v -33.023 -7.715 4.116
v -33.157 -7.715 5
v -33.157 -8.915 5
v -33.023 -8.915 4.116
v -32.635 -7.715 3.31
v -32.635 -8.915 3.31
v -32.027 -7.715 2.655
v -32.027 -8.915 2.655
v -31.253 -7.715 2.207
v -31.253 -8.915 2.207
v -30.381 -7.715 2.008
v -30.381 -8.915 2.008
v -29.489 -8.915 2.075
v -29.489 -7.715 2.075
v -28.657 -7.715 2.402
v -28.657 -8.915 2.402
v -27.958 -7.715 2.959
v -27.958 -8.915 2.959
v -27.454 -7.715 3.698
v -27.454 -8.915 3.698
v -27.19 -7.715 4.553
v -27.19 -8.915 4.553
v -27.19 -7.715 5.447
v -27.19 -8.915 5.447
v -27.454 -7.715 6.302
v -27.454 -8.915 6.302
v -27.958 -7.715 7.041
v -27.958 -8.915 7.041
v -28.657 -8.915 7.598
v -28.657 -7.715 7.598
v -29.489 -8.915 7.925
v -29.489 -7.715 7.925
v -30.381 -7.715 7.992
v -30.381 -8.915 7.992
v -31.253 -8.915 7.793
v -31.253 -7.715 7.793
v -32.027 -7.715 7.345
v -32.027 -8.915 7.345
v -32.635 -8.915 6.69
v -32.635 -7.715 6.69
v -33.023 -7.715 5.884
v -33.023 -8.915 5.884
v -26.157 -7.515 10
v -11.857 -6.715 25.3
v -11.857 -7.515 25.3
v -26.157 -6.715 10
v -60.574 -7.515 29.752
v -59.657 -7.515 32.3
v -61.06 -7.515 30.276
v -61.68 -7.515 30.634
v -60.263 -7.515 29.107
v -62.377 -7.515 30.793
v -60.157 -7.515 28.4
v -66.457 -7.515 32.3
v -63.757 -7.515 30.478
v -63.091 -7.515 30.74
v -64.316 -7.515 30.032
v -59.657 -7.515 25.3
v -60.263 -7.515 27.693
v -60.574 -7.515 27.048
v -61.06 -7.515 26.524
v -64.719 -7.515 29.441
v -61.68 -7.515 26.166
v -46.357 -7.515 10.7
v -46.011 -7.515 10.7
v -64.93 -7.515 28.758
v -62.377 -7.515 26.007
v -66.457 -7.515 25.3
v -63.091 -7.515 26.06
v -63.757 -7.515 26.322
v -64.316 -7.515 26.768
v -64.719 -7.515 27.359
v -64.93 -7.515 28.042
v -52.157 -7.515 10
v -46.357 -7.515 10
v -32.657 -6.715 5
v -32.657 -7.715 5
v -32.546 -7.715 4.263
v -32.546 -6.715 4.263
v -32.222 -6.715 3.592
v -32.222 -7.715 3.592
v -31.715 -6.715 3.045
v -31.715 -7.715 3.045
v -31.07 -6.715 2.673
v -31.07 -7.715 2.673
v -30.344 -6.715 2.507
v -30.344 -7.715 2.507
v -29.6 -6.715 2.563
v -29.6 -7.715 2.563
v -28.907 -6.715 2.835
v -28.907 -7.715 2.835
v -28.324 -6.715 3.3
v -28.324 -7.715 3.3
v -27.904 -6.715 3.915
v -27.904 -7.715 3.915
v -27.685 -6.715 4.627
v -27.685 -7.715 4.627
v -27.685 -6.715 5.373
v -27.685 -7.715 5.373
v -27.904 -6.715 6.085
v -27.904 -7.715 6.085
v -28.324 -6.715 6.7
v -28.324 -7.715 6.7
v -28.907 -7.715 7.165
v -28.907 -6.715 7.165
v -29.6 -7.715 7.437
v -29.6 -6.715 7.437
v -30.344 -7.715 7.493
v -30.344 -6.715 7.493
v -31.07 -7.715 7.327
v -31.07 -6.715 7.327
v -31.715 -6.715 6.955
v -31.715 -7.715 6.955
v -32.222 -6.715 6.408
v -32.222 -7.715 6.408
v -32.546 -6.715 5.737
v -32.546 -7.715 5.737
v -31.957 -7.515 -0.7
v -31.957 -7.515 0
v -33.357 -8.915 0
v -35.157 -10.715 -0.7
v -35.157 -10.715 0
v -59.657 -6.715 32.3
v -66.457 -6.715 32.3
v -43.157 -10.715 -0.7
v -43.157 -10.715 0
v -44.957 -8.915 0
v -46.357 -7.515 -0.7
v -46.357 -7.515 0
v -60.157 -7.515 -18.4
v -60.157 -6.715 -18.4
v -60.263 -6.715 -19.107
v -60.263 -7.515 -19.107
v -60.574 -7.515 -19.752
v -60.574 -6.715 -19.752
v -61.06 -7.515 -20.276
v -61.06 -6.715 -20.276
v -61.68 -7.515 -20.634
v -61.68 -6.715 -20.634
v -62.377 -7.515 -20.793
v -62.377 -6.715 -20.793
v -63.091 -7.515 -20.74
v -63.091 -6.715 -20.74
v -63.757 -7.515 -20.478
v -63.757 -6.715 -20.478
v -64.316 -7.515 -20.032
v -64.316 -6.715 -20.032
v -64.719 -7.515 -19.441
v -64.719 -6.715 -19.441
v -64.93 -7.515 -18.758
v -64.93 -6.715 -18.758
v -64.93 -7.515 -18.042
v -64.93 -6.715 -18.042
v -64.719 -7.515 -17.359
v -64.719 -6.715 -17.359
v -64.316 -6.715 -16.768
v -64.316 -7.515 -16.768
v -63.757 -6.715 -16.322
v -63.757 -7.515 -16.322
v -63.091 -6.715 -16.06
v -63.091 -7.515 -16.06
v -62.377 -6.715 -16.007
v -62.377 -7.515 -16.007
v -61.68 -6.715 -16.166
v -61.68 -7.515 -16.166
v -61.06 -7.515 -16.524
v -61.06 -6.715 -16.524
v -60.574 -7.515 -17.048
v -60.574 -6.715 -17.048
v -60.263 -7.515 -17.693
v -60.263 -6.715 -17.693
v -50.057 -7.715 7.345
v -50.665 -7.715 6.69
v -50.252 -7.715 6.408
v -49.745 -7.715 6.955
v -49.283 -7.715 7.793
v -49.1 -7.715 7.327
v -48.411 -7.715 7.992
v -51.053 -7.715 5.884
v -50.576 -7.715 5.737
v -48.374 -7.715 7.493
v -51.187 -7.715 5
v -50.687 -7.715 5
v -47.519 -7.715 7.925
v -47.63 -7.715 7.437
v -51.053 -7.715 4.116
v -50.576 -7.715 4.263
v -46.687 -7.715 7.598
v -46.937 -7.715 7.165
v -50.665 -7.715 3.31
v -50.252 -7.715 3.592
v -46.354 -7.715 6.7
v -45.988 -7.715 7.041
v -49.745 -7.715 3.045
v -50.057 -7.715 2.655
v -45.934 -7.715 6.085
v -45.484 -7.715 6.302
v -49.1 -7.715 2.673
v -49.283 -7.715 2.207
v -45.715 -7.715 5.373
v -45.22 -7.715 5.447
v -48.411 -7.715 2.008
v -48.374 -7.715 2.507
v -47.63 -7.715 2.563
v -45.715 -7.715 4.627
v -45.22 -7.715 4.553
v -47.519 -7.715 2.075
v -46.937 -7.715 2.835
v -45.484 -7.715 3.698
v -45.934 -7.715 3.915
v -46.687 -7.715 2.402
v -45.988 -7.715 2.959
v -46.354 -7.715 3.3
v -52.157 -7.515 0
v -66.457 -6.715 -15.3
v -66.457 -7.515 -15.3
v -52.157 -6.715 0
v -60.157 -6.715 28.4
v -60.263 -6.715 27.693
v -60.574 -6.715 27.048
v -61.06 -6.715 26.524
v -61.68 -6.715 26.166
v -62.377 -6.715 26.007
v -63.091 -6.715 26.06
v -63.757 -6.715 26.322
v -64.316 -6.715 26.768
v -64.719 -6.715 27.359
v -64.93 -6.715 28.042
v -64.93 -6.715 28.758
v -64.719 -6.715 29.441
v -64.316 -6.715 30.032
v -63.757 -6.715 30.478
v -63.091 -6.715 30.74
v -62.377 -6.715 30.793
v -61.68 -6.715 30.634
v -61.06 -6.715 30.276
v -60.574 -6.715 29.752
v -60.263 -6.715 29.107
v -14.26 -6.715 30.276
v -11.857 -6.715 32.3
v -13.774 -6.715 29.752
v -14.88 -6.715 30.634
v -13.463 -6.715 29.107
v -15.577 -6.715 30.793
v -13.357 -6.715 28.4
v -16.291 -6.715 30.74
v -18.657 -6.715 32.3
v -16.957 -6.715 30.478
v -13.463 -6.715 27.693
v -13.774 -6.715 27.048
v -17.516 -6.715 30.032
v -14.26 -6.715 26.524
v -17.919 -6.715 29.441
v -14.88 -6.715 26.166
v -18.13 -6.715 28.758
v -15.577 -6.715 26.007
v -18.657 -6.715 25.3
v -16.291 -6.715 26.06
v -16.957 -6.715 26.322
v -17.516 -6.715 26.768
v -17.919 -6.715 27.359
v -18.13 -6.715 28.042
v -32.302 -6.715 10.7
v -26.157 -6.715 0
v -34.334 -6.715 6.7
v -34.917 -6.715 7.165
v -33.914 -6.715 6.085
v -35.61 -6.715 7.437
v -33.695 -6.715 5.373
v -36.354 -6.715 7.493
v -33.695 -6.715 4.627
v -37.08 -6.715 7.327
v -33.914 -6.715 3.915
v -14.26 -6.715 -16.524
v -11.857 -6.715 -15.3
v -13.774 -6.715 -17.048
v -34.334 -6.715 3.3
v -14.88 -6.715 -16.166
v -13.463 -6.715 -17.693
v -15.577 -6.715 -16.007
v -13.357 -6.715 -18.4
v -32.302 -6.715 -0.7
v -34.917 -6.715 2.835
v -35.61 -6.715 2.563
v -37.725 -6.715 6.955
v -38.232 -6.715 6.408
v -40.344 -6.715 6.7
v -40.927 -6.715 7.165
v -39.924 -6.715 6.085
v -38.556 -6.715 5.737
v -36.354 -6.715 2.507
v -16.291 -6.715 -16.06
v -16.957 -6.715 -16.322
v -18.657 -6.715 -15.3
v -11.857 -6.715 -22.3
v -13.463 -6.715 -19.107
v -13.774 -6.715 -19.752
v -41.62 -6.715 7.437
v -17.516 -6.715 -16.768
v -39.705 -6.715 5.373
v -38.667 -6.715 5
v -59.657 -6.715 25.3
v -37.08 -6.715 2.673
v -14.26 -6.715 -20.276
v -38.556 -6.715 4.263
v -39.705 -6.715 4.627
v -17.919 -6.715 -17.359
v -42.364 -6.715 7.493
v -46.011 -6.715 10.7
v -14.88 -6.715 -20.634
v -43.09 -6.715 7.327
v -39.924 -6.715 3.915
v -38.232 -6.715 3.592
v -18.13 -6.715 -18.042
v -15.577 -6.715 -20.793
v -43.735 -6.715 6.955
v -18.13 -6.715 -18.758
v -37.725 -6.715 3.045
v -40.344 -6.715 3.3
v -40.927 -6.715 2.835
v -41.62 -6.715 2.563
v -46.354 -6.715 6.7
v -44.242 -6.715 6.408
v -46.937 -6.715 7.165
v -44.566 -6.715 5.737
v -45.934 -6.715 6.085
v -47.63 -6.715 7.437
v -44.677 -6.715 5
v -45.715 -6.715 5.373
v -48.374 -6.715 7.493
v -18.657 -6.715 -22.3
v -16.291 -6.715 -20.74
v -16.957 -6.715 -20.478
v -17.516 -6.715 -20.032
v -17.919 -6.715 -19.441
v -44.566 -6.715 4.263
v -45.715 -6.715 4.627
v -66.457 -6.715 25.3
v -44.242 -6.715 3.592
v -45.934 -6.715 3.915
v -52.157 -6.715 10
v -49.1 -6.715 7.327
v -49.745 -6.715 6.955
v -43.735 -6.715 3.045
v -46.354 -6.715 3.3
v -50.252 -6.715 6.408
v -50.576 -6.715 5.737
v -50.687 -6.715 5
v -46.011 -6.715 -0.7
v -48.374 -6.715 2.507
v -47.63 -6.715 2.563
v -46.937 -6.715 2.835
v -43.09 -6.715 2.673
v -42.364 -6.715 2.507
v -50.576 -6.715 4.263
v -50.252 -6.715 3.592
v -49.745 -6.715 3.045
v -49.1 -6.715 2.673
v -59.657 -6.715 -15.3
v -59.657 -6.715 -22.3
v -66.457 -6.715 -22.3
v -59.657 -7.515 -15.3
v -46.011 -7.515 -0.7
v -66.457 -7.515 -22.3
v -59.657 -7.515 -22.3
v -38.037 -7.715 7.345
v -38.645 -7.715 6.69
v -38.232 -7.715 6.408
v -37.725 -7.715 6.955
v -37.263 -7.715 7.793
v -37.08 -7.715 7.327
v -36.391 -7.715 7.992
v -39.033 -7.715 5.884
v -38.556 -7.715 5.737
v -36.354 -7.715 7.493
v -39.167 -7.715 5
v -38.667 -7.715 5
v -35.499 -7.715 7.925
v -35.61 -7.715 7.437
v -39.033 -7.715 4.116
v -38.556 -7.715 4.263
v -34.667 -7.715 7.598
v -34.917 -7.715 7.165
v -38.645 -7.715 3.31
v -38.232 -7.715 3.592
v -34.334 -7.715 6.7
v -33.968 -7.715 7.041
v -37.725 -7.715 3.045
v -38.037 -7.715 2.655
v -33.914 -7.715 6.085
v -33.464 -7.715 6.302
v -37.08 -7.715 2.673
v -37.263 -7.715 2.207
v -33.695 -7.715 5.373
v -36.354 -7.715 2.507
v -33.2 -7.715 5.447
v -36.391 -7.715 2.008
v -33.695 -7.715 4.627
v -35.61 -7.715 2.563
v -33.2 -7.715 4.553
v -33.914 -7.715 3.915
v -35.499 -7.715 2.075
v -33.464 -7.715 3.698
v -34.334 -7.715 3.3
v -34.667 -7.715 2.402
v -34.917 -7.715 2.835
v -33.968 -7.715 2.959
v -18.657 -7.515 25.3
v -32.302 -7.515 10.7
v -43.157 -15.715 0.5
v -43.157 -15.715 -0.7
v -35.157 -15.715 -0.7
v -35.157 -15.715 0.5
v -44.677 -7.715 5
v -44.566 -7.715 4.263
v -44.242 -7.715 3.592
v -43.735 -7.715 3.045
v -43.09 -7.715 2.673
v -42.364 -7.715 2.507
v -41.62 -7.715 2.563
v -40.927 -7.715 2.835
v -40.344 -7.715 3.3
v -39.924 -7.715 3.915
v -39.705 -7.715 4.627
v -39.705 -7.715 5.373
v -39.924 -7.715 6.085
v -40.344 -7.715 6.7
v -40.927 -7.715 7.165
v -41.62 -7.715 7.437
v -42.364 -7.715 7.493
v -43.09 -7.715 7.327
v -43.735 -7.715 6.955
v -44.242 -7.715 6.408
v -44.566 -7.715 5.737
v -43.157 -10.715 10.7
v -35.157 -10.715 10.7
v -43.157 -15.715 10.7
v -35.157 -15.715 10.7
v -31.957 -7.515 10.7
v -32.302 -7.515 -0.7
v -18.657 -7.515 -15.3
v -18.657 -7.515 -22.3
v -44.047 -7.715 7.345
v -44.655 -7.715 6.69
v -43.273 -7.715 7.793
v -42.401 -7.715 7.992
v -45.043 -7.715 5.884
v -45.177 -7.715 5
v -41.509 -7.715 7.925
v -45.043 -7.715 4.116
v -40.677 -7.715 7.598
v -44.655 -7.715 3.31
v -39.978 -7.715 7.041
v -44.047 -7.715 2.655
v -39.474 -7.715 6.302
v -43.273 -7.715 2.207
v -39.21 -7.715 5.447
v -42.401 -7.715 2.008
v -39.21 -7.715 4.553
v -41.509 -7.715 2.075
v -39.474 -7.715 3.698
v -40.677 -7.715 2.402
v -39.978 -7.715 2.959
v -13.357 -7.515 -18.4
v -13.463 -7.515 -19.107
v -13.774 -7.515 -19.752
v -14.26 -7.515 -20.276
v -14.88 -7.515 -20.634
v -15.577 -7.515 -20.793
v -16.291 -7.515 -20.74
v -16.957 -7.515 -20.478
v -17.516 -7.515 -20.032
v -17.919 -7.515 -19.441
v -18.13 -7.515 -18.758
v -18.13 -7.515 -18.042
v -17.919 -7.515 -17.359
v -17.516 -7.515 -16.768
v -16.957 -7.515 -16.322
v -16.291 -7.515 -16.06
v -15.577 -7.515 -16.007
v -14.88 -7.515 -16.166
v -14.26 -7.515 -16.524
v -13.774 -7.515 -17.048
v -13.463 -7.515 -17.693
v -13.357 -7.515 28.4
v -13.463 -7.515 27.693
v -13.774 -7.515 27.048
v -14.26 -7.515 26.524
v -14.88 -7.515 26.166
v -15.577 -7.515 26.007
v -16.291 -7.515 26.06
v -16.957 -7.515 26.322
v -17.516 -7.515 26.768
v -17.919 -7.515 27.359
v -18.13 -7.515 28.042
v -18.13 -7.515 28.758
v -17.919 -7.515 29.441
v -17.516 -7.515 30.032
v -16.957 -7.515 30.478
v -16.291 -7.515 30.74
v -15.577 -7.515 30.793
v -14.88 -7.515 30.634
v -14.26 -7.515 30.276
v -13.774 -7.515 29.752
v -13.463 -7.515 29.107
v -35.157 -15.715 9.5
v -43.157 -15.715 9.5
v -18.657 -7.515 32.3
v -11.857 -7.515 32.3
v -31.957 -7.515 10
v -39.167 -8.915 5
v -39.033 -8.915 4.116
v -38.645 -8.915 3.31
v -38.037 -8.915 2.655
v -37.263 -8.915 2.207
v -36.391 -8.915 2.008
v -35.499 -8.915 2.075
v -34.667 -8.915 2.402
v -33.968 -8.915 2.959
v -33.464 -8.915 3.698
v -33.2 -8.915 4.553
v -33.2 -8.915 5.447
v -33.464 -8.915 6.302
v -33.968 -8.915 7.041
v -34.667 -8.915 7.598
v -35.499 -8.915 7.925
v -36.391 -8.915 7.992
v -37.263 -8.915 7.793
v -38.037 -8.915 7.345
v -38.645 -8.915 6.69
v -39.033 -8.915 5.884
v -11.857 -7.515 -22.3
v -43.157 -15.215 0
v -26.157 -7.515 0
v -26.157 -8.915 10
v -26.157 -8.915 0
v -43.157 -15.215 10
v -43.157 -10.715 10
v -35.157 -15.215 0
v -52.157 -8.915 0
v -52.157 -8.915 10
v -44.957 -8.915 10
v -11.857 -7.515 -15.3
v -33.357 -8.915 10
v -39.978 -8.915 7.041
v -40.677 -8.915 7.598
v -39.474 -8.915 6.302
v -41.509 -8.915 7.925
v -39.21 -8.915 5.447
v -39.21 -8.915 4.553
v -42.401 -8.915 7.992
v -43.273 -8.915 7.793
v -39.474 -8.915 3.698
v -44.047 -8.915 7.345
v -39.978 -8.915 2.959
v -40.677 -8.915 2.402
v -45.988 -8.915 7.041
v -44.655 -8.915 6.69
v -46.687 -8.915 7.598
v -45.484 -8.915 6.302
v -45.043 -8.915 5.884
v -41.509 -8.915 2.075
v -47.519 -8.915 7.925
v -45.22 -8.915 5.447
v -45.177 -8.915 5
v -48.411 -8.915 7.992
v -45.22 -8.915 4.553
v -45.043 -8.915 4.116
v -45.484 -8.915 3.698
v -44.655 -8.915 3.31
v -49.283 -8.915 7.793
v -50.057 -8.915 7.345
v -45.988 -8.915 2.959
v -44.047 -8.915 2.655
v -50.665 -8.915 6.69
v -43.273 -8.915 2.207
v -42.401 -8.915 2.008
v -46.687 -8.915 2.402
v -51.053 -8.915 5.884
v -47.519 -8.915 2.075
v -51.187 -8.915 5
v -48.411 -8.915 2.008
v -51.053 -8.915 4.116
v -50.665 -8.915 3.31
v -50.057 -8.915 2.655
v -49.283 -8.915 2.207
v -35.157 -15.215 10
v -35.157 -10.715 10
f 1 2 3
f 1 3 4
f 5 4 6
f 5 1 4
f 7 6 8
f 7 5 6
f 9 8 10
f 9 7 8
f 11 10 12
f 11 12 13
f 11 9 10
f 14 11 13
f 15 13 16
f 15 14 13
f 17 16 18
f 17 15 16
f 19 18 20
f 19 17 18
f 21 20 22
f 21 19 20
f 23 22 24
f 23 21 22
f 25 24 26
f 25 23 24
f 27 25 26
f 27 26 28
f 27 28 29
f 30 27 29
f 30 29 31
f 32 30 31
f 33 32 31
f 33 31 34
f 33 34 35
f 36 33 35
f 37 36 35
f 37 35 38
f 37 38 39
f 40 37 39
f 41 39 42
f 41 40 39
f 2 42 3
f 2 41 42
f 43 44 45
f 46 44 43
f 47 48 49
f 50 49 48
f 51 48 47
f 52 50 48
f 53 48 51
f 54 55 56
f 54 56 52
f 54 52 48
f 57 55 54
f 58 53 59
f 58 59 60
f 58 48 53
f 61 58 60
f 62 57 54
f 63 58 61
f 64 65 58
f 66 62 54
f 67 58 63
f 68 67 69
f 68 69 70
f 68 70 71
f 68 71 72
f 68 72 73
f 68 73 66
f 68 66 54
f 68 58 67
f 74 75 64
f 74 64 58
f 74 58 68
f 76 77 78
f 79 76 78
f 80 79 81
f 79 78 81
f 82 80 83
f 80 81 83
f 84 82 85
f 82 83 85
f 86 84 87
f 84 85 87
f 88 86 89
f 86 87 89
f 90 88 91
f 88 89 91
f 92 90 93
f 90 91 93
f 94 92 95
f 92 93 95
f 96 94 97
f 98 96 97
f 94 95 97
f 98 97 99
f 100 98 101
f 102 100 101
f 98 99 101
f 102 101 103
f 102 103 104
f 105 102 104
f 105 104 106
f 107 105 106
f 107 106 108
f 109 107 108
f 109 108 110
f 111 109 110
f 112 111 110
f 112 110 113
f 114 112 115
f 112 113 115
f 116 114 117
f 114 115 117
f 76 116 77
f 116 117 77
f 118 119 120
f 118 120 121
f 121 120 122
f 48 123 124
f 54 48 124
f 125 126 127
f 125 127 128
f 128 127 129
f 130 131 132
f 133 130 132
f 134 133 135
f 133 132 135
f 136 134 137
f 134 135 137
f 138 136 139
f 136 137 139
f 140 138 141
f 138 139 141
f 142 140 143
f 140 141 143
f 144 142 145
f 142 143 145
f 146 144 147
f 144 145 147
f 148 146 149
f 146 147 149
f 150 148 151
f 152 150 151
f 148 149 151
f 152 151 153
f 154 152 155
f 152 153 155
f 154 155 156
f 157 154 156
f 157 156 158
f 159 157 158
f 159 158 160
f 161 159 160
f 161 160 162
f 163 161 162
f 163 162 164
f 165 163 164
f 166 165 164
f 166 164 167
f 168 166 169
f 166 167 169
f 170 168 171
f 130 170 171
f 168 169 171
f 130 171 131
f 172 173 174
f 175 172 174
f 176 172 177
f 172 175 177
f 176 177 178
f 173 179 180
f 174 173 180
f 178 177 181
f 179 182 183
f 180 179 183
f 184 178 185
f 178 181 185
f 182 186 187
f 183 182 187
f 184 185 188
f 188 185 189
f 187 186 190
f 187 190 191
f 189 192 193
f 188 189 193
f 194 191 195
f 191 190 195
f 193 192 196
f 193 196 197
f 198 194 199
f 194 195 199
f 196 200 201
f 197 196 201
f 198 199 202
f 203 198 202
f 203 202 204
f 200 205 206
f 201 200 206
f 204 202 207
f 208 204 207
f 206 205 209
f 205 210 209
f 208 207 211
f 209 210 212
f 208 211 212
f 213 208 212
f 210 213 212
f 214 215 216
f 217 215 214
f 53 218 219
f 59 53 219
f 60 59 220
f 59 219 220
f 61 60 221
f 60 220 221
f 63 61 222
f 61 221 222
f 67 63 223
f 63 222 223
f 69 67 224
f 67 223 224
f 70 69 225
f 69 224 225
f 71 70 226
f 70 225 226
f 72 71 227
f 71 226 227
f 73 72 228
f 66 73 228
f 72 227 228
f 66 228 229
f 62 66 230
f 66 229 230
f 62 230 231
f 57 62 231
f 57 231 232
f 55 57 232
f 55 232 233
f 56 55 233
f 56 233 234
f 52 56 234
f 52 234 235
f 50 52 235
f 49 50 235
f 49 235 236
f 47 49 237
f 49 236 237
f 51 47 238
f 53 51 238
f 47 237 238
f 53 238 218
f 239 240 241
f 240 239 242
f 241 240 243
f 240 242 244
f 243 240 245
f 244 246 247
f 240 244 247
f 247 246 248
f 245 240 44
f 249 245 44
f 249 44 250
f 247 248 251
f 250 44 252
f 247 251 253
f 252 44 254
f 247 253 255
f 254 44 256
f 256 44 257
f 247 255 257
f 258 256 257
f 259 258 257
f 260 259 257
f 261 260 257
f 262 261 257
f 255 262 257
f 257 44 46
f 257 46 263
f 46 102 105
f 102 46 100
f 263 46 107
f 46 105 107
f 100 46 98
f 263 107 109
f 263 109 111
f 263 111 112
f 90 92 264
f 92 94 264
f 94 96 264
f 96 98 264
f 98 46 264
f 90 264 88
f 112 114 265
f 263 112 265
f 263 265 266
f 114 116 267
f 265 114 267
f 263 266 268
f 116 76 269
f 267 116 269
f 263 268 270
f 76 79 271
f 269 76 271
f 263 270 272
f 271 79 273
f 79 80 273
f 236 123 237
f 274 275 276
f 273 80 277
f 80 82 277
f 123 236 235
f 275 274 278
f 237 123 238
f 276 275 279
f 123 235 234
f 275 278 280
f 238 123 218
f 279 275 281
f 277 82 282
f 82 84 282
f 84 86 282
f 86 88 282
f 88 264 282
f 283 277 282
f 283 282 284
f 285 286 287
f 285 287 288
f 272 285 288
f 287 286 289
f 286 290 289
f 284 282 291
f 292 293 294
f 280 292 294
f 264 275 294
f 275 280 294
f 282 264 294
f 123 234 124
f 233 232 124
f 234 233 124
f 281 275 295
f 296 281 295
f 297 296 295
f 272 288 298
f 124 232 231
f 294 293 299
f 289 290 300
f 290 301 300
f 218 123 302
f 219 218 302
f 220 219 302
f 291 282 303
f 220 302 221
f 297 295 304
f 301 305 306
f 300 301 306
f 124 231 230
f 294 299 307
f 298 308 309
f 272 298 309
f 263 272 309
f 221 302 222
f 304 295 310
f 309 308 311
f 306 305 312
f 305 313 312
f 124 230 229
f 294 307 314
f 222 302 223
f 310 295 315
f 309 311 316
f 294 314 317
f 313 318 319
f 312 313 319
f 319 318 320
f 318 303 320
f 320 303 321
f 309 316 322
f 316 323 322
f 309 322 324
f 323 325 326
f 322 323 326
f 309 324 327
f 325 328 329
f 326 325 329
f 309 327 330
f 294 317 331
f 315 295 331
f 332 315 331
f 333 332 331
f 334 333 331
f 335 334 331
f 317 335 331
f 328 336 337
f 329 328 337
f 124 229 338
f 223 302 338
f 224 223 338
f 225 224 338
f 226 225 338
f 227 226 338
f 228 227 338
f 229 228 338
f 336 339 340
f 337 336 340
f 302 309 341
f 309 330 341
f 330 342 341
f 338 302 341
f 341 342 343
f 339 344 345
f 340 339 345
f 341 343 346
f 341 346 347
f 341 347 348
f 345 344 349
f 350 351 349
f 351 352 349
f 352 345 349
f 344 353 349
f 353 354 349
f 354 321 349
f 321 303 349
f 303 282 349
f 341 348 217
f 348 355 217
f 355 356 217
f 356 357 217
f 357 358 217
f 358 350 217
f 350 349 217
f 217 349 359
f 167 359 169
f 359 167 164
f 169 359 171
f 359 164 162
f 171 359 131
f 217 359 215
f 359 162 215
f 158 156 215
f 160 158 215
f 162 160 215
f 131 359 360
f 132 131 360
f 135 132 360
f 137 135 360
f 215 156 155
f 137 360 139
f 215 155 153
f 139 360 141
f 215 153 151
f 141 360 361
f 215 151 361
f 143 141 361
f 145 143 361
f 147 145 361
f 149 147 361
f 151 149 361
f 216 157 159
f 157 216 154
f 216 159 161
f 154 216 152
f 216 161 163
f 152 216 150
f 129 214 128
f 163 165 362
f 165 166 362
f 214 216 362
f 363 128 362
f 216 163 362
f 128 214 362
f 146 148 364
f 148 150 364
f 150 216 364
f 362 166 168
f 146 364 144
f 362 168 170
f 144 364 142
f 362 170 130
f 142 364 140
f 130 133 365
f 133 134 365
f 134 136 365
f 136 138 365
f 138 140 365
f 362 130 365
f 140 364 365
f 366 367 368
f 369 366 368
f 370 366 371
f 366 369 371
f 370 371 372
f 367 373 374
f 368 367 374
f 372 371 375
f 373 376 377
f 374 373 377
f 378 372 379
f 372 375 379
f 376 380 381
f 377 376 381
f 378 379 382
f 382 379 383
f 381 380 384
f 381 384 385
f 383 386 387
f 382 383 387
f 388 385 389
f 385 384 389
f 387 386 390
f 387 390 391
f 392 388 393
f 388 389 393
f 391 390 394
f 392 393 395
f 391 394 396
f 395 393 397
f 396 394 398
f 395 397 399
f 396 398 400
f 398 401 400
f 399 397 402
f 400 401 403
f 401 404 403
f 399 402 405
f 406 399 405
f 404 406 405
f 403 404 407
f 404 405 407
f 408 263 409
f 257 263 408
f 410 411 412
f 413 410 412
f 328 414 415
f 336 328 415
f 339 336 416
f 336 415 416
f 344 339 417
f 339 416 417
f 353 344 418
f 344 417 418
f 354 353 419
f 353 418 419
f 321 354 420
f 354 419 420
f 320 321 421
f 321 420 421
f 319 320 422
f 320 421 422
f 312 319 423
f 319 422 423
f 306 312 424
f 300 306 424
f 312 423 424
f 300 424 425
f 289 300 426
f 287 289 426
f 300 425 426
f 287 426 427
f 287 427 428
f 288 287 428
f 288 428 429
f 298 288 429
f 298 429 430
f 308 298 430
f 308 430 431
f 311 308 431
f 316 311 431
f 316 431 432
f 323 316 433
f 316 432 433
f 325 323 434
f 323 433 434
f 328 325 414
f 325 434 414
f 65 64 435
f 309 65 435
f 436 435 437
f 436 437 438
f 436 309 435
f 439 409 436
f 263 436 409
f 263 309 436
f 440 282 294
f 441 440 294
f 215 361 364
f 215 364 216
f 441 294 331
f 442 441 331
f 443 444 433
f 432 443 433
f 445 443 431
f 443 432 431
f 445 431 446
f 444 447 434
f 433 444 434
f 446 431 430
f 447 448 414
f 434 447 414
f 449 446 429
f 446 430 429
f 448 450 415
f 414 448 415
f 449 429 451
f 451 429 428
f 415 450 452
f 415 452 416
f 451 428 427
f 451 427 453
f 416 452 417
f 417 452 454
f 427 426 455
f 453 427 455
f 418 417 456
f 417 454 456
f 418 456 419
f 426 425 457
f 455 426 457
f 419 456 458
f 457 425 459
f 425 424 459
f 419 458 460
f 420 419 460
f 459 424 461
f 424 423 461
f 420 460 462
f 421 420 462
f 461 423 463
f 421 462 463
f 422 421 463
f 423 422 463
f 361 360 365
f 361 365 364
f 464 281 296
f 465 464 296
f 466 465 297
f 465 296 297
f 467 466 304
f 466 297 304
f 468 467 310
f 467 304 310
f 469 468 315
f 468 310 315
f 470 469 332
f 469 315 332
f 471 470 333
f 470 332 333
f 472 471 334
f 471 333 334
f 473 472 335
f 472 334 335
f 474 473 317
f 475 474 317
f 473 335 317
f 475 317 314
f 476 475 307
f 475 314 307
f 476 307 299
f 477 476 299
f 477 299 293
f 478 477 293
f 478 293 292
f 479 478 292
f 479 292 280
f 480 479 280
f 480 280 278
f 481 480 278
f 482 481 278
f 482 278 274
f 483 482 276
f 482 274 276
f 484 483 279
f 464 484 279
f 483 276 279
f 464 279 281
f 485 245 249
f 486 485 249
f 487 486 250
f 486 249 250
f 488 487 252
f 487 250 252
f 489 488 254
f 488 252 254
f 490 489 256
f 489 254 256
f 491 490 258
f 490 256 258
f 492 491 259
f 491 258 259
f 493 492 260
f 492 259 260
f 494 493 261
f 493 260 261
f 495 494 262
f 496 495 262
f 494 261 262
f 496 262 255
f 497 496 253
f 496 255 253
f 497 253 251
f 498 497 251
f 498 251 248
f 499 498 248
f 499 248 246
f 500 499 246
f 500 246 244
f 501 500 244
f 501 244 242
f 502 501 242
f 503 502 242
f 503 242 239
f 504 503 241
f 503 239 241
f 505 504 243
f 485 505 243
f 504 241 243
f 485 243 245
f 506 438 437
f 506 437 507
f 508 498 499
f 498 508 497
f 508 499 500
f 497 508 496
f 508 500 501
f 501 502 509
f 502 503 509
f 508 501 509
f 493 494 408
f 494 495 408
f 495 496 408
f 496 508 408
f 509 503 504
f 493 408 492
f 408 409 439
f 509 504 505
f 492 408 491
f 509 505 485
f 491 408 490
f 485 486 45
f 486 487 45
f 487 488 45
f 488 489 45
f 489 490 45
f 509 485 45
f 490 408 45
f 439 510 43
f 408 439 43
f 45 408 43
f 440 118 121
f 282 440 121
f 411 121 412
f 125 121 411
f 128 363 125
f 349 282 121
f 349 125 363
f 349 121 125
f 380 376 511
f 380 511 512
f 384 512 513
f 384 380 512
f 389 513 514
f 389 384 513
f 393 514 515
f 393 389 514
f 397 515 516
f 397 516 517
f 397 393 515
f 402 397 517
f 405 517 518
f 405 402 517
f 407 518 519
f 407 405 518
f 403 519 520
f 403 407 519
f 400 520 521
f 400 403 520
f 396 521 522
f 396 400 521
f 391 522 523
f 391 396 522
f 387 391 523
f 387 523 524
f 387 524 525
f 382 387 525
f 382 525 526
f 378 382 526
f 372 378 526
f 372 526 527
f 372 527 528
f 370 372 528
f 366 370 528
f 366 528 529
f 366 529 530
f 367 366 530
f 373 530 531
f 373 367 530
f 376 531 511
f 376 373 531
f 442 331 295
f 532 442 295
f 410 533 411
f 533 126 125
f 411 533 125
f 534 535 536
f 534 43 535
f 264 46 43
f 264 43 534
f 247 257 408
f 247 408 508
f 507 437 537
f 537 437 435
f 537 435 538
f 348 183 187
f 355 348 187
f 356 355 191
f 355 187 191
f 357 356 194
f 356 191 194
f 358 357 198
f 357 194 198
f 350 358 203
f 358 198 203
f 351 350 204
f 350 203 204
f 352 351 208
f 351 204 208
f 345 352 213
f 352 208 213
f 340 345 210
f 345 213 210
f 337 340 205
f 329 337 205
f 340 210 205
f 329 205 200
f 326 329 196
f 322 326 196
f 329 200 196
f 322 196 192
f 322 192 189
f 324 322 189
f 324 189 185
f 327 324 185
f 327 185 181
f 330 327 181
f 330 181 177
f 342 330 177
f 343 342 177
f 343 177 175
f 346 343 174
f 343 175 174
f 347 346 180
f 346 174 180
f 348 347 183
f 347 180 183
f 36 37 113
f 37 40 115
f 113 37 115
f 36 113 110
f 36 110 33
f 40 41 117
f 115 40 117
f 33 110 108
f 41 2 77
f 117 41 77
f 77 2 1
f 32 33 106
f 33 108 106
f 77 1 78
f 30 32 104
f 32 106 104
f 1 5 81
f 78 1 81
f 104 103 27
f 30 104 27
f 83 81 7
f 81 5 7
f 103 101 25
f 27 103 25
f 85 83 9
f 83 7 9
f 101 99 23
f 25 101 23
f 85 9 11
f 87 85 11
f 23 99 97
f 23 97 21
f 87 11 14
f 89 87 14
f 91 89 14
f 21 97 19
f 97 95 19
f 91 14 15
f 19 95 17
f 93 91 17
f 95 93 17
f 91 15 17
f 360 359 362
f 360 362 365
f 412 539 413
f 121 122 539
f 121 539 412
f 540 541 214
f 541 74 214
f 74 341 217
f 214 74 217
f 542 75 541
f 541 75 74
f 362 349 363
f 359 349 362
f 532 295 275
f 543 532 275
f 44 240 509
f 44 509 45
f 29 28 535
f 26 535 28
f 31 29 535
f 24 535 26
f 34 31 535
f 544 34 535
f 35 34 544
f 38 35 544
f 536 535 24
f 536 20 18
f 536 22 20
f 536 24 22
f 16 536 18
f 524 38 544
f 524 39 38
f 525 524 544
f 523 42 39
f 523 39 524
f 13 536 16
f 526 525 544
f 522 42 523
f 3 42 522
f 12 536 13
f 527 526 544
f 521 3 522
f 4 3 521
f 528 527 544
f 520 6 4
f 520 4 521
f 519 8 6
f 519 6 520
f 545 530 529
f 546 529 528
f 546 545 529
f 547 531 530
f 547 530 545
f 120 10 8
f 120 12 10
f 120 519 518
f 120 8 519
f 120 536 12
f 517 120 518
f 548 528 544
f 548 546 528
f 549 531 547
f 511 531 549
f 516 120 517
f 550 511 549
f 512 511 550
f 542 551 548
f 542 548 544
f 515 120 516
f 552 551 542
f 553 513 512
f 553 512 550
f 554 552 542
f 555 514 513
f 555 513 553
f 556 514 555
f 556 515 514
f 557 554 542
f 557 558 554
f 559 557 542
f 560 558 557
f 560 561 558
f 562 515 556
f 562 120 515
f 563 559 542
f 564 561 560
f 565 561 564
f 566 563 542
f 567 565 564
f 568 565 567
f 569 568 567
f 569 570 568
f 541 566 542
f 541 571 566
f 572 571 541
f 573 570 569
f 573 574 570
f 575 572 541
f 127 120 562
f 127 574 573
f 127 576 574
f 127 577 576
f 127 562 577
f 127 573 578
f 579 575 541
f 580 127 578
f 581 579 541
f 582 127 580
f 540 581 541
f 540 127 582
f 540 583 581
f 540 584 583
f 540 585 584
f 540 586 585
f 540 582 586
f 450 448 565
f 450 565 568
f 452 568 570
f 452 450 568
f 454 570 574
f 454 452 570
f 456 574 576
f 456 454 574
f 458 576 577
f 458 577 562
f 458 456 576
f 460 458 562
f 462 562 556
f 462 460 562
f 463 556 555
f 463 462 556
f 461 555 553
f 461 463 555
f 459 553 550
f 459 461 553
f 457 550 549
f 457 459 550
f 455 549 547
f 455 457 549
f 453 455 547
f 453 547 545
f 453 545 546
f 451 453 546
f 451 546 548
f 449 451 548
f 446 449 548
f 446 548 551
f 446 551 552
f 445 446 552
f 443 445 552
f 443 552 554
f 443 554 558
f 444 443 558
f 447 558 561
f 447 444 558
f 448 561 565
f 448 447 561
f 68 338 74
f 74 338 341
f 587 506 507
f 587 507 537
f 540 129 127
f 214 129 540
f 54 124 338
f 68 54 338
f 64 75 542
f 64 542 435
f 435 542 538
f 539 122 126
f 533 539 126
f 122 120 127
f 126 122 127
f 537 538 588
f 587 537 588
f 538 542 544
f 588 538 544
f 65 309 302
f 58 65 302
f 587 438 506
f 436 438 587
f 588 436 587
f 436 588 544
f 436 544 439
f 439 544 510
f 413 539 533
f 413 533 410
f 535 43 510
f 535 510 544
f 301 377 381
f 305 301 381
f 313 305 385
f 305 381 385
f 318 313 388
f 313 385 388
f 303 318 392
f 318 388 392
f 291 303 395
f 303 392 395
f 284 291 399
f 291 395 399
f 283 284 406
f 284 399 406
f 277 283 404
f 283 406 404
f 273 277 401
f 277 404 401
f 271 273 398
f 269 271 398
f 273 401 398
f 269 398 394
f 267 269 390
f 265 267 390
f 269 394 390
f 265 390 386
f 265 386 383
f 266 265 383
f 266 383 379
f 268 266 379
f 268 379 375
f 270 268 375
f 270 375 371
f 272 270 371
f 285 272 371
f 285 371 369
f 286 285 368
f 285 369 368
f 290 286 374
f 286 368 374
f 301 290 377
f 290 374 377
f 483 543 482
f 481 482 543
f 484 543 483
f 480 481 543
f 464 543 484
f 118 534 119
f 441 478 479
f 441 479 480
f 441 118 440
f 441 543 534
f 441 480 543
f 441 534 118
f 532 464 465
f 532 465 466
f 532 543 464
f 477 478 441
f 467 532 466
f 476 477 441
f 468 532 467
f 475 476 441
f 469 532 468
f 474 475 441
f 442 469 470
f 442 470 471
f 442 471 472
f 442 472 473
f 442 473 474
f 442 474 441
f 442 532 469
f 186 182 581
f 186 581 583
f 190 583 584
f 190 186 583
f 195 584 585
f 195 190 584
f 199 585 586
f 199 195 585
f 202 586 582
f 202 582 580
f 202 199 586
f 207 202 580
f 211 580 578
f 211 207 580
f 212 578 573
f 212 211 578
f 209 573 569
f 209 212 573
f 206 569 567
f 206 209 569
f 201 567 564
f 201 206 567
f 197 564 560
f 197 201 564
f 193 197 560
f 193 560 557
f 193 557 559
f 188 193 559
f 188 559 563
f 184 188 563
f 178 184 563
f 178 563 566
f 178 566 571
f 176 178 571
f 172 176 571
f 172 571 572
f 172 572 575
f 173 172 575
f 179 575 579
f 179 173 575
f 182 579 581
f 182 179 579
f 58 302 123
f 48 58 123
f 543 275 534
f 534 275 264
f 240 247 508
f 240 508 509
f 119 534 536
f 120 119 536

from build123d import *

# Parameters (mm, degrees)
SKICA1_W                 = 26
SKICA1_H                 = 1
P_IDAT_VYSUNUT_M1_DEPTH  = 10
SKICA2_R                 = 2.5
ODEBRAT_VYSUNUT_M1_DEPTH = 1
SKICA3_R                 = 2.4
P_IDAT_VYSUNUT_M2_DEPTH  = 0.8
SKICA4_W                 = 26
SKICA4_H                 = 10
SKICA4_R                 = 3
P_IDAT_VYSUNUT_M3_DEPTH  = 1.2
SKICA6_W                 = 8
SKICA6_H                 = 0.7
P_IDAT_VYSUNUT_M5_DEPTH  = 9
P_IDAT_VYSUNUT_M6_DEPTH  = 8
P_IDAT_VYSUNUT_M8_DEPTH  = 0.7
P_IDAT_VYSUNUT_M9_DEPTH  = 0.7


with BuildPart() as part:
    # Skica1 → Přidat vysunutím1 (new body)
    with BuildSketch(Plane.XY):
        with Locations((-39.156744291, -7.214704976)):
            Rectangle(SKICA1_W, SKICA1_H)
    extrude(amount=P_IDAT_VYSUNUT_M1_DEPTH)

    # Skica2 → Odebrat vysunutím1 (cut)
    with BuildSketch(Plane(origin=(0, -7.714704976, 0), x_dir=(-1, 0, 0), z_dir=(0, -1, 0))):
        with Locations((48.186744291, -5)):
            Circle(SKICA2_R)
        with Locations((42.176744291, -5)):
            Circle(SKICA2_R)
        with Locations((36.166744291, -5)):
            Circle(SKICA2_R)
        with Locations((30.156744291, -5)):
            Circle(SKICA2_R)
    extrude(amount=-ODEBRAT_VYSUNUT_M1_DEPTH, mode=Mode.SUBTRACT)

    # Skica3 → Přidat vysunutím2 (add)
    with BuildSketch(Plane(origin=(0, -6.714704976, 0), x_dir=(1, 0, 0), z_dir=(0, 1, 0))):
        Polygon((-32.956744291, 0), (-18.656744291, 15.3), (-18.656744291, 22.3), (-11.856744291, 22.3), (-11.856744291, 15.3), (-26.156744291, 0), align=None)
        with Locations((-15.756744291, 18.4)):
            Circle(SKICA3_R, mode=Mode.SUBTRACT)
        Polygon((-52.156744291, 0), (-45.356744291, 0), (-59.656744291, 15.3), (-59.656744291, 22.3), (-66.456744291, 22.3), (-66.456744291, 15.3), align=None)
        with Locations((-62.556744291, 18.4)):
            Circle(SKICA3_R, mode=Mode.SUBTRACT)
        Polygon((-45.356744291, -10), (-59.656744291, -25.3), (-59.656744291, -32.3), (-66.456744291, -32.3), (-66.456744291, -25.3), (-52.156744291, -10), align=None)
        with Locations((-62.556744291, -28.4)):
            Circle(SKICA3_R, mode=Mode.SUBTRACT)
        Polygon((-26.156744291, -10), (-32.956744291, -10), (-18.656744291, -25.3), (-18.656744291, -32.3), (-11.856744291, -32.3), (-11.856744291, -25.3), align=None)
        with Locations((-15.756744291, -28.4)):
            Circle(SKICA3_R, mode=Mode.SUBTRACT)
    extrude(amount=-P_IDAT_VYSUNUT_M2_DEPTH)

    # Skica4 → Přidat vysunutím3 (add)
    with BuildSketch(Plane(origin=(0, -7.714704976, 0), x_dir=(-1, 0, 0), z_dir=(0, -1, 0))):
        with Locations((39.156744291, -5)):
            Rectangle(SKICA4_W, SKICA4_H)
        with Locations((48.186744291, -5)):
            Circle(SKICA4_R, mode=Mode.SUBTRACT)
        with Locations((42.176744291, -5)):
            Circle(SKICA4_R, mode=Mode.SUBTRACT)
        with Locations((36.166744291, -5)):
            Circle(SKICA4_R, mode=Mode.SUBTRACT)
        with Locations((30.156744291, -5)):
            Circle(SKICA4_R, mode=Mode.SUBTRACT)
    extrude(amount=P_IDAT_VYSUNUT_M3_DEPTH)

    # Skica6 → Přidat vysunutím5 (add)
    with BuildSketch(Plane(origin=(0, -6.714704976, 0), x_dir=(1, 0, 0), z_dir=(0, 1, 0))):
        with Locations((-39.156744291, 0.35)):
            Rectangle(SKICA6_W, SKICA6_H)
        with Locations((-39.156744291, -10.35)):
            Rectangle(SKICA6_W, SKICA6_H)
    extrude(amount=-P_IDAT_VYSUNUT_M5_DEPTH)

    # Skica7 → Přidat vysunutím6 (add)
    with BuildSketch(Plane(origin=(-35.156744291, 0, 0), x_dir=(0, 0, -1), z_dir=(1, 0, 0))):
        Polygon((-10, -15.714704976), (-9.5, -15.714704976), (-10, -15.214704976), align=None)
        Polygon((0, -15.714704976), (0, -15.214704976), (-0.5, -15.714704976), align=None)
    extrude(amount=-P_IDAT_VYSUNUT_M6_DEPTH)

    # Skica8 → Přidat vysunutím8 (add)
    with BuildSketch(Plane(origin=(0, 0, 0), x_dir=(-1, 0, 0), z_dir=(0, 0, -1))):
        Polygon((43.156744291, -6.714704976), (43.156744291, -10.714704976), (47.156744291, -6.714704976), align=None)
        Polygon((35.156744291, -10.714704976), (35.156744291, -6.714704976), (31.156744291, -6.714704976), align=None)
    extrude(amount=P_IDAT_VYSUNUT_M8_DEPTH)

    # Skica9 → Přidat vysunutím9 (add)
    with BuildSketch(Plane.XY.offset(10)):
        Polygon((-43.156744291, -6.714704976), (-47.156744291, -6.714704976), (-43.156744291, -10.714704976), align=None)
        Polygon((-35.156744291, -6.714704976), (-35.156744291, -10.714704976), (-31.156744291, -6.714704976), align=None)
    extrude(amount=P_IDAT_VYSUNUT_M9_DEPTH)


solid = part.part
